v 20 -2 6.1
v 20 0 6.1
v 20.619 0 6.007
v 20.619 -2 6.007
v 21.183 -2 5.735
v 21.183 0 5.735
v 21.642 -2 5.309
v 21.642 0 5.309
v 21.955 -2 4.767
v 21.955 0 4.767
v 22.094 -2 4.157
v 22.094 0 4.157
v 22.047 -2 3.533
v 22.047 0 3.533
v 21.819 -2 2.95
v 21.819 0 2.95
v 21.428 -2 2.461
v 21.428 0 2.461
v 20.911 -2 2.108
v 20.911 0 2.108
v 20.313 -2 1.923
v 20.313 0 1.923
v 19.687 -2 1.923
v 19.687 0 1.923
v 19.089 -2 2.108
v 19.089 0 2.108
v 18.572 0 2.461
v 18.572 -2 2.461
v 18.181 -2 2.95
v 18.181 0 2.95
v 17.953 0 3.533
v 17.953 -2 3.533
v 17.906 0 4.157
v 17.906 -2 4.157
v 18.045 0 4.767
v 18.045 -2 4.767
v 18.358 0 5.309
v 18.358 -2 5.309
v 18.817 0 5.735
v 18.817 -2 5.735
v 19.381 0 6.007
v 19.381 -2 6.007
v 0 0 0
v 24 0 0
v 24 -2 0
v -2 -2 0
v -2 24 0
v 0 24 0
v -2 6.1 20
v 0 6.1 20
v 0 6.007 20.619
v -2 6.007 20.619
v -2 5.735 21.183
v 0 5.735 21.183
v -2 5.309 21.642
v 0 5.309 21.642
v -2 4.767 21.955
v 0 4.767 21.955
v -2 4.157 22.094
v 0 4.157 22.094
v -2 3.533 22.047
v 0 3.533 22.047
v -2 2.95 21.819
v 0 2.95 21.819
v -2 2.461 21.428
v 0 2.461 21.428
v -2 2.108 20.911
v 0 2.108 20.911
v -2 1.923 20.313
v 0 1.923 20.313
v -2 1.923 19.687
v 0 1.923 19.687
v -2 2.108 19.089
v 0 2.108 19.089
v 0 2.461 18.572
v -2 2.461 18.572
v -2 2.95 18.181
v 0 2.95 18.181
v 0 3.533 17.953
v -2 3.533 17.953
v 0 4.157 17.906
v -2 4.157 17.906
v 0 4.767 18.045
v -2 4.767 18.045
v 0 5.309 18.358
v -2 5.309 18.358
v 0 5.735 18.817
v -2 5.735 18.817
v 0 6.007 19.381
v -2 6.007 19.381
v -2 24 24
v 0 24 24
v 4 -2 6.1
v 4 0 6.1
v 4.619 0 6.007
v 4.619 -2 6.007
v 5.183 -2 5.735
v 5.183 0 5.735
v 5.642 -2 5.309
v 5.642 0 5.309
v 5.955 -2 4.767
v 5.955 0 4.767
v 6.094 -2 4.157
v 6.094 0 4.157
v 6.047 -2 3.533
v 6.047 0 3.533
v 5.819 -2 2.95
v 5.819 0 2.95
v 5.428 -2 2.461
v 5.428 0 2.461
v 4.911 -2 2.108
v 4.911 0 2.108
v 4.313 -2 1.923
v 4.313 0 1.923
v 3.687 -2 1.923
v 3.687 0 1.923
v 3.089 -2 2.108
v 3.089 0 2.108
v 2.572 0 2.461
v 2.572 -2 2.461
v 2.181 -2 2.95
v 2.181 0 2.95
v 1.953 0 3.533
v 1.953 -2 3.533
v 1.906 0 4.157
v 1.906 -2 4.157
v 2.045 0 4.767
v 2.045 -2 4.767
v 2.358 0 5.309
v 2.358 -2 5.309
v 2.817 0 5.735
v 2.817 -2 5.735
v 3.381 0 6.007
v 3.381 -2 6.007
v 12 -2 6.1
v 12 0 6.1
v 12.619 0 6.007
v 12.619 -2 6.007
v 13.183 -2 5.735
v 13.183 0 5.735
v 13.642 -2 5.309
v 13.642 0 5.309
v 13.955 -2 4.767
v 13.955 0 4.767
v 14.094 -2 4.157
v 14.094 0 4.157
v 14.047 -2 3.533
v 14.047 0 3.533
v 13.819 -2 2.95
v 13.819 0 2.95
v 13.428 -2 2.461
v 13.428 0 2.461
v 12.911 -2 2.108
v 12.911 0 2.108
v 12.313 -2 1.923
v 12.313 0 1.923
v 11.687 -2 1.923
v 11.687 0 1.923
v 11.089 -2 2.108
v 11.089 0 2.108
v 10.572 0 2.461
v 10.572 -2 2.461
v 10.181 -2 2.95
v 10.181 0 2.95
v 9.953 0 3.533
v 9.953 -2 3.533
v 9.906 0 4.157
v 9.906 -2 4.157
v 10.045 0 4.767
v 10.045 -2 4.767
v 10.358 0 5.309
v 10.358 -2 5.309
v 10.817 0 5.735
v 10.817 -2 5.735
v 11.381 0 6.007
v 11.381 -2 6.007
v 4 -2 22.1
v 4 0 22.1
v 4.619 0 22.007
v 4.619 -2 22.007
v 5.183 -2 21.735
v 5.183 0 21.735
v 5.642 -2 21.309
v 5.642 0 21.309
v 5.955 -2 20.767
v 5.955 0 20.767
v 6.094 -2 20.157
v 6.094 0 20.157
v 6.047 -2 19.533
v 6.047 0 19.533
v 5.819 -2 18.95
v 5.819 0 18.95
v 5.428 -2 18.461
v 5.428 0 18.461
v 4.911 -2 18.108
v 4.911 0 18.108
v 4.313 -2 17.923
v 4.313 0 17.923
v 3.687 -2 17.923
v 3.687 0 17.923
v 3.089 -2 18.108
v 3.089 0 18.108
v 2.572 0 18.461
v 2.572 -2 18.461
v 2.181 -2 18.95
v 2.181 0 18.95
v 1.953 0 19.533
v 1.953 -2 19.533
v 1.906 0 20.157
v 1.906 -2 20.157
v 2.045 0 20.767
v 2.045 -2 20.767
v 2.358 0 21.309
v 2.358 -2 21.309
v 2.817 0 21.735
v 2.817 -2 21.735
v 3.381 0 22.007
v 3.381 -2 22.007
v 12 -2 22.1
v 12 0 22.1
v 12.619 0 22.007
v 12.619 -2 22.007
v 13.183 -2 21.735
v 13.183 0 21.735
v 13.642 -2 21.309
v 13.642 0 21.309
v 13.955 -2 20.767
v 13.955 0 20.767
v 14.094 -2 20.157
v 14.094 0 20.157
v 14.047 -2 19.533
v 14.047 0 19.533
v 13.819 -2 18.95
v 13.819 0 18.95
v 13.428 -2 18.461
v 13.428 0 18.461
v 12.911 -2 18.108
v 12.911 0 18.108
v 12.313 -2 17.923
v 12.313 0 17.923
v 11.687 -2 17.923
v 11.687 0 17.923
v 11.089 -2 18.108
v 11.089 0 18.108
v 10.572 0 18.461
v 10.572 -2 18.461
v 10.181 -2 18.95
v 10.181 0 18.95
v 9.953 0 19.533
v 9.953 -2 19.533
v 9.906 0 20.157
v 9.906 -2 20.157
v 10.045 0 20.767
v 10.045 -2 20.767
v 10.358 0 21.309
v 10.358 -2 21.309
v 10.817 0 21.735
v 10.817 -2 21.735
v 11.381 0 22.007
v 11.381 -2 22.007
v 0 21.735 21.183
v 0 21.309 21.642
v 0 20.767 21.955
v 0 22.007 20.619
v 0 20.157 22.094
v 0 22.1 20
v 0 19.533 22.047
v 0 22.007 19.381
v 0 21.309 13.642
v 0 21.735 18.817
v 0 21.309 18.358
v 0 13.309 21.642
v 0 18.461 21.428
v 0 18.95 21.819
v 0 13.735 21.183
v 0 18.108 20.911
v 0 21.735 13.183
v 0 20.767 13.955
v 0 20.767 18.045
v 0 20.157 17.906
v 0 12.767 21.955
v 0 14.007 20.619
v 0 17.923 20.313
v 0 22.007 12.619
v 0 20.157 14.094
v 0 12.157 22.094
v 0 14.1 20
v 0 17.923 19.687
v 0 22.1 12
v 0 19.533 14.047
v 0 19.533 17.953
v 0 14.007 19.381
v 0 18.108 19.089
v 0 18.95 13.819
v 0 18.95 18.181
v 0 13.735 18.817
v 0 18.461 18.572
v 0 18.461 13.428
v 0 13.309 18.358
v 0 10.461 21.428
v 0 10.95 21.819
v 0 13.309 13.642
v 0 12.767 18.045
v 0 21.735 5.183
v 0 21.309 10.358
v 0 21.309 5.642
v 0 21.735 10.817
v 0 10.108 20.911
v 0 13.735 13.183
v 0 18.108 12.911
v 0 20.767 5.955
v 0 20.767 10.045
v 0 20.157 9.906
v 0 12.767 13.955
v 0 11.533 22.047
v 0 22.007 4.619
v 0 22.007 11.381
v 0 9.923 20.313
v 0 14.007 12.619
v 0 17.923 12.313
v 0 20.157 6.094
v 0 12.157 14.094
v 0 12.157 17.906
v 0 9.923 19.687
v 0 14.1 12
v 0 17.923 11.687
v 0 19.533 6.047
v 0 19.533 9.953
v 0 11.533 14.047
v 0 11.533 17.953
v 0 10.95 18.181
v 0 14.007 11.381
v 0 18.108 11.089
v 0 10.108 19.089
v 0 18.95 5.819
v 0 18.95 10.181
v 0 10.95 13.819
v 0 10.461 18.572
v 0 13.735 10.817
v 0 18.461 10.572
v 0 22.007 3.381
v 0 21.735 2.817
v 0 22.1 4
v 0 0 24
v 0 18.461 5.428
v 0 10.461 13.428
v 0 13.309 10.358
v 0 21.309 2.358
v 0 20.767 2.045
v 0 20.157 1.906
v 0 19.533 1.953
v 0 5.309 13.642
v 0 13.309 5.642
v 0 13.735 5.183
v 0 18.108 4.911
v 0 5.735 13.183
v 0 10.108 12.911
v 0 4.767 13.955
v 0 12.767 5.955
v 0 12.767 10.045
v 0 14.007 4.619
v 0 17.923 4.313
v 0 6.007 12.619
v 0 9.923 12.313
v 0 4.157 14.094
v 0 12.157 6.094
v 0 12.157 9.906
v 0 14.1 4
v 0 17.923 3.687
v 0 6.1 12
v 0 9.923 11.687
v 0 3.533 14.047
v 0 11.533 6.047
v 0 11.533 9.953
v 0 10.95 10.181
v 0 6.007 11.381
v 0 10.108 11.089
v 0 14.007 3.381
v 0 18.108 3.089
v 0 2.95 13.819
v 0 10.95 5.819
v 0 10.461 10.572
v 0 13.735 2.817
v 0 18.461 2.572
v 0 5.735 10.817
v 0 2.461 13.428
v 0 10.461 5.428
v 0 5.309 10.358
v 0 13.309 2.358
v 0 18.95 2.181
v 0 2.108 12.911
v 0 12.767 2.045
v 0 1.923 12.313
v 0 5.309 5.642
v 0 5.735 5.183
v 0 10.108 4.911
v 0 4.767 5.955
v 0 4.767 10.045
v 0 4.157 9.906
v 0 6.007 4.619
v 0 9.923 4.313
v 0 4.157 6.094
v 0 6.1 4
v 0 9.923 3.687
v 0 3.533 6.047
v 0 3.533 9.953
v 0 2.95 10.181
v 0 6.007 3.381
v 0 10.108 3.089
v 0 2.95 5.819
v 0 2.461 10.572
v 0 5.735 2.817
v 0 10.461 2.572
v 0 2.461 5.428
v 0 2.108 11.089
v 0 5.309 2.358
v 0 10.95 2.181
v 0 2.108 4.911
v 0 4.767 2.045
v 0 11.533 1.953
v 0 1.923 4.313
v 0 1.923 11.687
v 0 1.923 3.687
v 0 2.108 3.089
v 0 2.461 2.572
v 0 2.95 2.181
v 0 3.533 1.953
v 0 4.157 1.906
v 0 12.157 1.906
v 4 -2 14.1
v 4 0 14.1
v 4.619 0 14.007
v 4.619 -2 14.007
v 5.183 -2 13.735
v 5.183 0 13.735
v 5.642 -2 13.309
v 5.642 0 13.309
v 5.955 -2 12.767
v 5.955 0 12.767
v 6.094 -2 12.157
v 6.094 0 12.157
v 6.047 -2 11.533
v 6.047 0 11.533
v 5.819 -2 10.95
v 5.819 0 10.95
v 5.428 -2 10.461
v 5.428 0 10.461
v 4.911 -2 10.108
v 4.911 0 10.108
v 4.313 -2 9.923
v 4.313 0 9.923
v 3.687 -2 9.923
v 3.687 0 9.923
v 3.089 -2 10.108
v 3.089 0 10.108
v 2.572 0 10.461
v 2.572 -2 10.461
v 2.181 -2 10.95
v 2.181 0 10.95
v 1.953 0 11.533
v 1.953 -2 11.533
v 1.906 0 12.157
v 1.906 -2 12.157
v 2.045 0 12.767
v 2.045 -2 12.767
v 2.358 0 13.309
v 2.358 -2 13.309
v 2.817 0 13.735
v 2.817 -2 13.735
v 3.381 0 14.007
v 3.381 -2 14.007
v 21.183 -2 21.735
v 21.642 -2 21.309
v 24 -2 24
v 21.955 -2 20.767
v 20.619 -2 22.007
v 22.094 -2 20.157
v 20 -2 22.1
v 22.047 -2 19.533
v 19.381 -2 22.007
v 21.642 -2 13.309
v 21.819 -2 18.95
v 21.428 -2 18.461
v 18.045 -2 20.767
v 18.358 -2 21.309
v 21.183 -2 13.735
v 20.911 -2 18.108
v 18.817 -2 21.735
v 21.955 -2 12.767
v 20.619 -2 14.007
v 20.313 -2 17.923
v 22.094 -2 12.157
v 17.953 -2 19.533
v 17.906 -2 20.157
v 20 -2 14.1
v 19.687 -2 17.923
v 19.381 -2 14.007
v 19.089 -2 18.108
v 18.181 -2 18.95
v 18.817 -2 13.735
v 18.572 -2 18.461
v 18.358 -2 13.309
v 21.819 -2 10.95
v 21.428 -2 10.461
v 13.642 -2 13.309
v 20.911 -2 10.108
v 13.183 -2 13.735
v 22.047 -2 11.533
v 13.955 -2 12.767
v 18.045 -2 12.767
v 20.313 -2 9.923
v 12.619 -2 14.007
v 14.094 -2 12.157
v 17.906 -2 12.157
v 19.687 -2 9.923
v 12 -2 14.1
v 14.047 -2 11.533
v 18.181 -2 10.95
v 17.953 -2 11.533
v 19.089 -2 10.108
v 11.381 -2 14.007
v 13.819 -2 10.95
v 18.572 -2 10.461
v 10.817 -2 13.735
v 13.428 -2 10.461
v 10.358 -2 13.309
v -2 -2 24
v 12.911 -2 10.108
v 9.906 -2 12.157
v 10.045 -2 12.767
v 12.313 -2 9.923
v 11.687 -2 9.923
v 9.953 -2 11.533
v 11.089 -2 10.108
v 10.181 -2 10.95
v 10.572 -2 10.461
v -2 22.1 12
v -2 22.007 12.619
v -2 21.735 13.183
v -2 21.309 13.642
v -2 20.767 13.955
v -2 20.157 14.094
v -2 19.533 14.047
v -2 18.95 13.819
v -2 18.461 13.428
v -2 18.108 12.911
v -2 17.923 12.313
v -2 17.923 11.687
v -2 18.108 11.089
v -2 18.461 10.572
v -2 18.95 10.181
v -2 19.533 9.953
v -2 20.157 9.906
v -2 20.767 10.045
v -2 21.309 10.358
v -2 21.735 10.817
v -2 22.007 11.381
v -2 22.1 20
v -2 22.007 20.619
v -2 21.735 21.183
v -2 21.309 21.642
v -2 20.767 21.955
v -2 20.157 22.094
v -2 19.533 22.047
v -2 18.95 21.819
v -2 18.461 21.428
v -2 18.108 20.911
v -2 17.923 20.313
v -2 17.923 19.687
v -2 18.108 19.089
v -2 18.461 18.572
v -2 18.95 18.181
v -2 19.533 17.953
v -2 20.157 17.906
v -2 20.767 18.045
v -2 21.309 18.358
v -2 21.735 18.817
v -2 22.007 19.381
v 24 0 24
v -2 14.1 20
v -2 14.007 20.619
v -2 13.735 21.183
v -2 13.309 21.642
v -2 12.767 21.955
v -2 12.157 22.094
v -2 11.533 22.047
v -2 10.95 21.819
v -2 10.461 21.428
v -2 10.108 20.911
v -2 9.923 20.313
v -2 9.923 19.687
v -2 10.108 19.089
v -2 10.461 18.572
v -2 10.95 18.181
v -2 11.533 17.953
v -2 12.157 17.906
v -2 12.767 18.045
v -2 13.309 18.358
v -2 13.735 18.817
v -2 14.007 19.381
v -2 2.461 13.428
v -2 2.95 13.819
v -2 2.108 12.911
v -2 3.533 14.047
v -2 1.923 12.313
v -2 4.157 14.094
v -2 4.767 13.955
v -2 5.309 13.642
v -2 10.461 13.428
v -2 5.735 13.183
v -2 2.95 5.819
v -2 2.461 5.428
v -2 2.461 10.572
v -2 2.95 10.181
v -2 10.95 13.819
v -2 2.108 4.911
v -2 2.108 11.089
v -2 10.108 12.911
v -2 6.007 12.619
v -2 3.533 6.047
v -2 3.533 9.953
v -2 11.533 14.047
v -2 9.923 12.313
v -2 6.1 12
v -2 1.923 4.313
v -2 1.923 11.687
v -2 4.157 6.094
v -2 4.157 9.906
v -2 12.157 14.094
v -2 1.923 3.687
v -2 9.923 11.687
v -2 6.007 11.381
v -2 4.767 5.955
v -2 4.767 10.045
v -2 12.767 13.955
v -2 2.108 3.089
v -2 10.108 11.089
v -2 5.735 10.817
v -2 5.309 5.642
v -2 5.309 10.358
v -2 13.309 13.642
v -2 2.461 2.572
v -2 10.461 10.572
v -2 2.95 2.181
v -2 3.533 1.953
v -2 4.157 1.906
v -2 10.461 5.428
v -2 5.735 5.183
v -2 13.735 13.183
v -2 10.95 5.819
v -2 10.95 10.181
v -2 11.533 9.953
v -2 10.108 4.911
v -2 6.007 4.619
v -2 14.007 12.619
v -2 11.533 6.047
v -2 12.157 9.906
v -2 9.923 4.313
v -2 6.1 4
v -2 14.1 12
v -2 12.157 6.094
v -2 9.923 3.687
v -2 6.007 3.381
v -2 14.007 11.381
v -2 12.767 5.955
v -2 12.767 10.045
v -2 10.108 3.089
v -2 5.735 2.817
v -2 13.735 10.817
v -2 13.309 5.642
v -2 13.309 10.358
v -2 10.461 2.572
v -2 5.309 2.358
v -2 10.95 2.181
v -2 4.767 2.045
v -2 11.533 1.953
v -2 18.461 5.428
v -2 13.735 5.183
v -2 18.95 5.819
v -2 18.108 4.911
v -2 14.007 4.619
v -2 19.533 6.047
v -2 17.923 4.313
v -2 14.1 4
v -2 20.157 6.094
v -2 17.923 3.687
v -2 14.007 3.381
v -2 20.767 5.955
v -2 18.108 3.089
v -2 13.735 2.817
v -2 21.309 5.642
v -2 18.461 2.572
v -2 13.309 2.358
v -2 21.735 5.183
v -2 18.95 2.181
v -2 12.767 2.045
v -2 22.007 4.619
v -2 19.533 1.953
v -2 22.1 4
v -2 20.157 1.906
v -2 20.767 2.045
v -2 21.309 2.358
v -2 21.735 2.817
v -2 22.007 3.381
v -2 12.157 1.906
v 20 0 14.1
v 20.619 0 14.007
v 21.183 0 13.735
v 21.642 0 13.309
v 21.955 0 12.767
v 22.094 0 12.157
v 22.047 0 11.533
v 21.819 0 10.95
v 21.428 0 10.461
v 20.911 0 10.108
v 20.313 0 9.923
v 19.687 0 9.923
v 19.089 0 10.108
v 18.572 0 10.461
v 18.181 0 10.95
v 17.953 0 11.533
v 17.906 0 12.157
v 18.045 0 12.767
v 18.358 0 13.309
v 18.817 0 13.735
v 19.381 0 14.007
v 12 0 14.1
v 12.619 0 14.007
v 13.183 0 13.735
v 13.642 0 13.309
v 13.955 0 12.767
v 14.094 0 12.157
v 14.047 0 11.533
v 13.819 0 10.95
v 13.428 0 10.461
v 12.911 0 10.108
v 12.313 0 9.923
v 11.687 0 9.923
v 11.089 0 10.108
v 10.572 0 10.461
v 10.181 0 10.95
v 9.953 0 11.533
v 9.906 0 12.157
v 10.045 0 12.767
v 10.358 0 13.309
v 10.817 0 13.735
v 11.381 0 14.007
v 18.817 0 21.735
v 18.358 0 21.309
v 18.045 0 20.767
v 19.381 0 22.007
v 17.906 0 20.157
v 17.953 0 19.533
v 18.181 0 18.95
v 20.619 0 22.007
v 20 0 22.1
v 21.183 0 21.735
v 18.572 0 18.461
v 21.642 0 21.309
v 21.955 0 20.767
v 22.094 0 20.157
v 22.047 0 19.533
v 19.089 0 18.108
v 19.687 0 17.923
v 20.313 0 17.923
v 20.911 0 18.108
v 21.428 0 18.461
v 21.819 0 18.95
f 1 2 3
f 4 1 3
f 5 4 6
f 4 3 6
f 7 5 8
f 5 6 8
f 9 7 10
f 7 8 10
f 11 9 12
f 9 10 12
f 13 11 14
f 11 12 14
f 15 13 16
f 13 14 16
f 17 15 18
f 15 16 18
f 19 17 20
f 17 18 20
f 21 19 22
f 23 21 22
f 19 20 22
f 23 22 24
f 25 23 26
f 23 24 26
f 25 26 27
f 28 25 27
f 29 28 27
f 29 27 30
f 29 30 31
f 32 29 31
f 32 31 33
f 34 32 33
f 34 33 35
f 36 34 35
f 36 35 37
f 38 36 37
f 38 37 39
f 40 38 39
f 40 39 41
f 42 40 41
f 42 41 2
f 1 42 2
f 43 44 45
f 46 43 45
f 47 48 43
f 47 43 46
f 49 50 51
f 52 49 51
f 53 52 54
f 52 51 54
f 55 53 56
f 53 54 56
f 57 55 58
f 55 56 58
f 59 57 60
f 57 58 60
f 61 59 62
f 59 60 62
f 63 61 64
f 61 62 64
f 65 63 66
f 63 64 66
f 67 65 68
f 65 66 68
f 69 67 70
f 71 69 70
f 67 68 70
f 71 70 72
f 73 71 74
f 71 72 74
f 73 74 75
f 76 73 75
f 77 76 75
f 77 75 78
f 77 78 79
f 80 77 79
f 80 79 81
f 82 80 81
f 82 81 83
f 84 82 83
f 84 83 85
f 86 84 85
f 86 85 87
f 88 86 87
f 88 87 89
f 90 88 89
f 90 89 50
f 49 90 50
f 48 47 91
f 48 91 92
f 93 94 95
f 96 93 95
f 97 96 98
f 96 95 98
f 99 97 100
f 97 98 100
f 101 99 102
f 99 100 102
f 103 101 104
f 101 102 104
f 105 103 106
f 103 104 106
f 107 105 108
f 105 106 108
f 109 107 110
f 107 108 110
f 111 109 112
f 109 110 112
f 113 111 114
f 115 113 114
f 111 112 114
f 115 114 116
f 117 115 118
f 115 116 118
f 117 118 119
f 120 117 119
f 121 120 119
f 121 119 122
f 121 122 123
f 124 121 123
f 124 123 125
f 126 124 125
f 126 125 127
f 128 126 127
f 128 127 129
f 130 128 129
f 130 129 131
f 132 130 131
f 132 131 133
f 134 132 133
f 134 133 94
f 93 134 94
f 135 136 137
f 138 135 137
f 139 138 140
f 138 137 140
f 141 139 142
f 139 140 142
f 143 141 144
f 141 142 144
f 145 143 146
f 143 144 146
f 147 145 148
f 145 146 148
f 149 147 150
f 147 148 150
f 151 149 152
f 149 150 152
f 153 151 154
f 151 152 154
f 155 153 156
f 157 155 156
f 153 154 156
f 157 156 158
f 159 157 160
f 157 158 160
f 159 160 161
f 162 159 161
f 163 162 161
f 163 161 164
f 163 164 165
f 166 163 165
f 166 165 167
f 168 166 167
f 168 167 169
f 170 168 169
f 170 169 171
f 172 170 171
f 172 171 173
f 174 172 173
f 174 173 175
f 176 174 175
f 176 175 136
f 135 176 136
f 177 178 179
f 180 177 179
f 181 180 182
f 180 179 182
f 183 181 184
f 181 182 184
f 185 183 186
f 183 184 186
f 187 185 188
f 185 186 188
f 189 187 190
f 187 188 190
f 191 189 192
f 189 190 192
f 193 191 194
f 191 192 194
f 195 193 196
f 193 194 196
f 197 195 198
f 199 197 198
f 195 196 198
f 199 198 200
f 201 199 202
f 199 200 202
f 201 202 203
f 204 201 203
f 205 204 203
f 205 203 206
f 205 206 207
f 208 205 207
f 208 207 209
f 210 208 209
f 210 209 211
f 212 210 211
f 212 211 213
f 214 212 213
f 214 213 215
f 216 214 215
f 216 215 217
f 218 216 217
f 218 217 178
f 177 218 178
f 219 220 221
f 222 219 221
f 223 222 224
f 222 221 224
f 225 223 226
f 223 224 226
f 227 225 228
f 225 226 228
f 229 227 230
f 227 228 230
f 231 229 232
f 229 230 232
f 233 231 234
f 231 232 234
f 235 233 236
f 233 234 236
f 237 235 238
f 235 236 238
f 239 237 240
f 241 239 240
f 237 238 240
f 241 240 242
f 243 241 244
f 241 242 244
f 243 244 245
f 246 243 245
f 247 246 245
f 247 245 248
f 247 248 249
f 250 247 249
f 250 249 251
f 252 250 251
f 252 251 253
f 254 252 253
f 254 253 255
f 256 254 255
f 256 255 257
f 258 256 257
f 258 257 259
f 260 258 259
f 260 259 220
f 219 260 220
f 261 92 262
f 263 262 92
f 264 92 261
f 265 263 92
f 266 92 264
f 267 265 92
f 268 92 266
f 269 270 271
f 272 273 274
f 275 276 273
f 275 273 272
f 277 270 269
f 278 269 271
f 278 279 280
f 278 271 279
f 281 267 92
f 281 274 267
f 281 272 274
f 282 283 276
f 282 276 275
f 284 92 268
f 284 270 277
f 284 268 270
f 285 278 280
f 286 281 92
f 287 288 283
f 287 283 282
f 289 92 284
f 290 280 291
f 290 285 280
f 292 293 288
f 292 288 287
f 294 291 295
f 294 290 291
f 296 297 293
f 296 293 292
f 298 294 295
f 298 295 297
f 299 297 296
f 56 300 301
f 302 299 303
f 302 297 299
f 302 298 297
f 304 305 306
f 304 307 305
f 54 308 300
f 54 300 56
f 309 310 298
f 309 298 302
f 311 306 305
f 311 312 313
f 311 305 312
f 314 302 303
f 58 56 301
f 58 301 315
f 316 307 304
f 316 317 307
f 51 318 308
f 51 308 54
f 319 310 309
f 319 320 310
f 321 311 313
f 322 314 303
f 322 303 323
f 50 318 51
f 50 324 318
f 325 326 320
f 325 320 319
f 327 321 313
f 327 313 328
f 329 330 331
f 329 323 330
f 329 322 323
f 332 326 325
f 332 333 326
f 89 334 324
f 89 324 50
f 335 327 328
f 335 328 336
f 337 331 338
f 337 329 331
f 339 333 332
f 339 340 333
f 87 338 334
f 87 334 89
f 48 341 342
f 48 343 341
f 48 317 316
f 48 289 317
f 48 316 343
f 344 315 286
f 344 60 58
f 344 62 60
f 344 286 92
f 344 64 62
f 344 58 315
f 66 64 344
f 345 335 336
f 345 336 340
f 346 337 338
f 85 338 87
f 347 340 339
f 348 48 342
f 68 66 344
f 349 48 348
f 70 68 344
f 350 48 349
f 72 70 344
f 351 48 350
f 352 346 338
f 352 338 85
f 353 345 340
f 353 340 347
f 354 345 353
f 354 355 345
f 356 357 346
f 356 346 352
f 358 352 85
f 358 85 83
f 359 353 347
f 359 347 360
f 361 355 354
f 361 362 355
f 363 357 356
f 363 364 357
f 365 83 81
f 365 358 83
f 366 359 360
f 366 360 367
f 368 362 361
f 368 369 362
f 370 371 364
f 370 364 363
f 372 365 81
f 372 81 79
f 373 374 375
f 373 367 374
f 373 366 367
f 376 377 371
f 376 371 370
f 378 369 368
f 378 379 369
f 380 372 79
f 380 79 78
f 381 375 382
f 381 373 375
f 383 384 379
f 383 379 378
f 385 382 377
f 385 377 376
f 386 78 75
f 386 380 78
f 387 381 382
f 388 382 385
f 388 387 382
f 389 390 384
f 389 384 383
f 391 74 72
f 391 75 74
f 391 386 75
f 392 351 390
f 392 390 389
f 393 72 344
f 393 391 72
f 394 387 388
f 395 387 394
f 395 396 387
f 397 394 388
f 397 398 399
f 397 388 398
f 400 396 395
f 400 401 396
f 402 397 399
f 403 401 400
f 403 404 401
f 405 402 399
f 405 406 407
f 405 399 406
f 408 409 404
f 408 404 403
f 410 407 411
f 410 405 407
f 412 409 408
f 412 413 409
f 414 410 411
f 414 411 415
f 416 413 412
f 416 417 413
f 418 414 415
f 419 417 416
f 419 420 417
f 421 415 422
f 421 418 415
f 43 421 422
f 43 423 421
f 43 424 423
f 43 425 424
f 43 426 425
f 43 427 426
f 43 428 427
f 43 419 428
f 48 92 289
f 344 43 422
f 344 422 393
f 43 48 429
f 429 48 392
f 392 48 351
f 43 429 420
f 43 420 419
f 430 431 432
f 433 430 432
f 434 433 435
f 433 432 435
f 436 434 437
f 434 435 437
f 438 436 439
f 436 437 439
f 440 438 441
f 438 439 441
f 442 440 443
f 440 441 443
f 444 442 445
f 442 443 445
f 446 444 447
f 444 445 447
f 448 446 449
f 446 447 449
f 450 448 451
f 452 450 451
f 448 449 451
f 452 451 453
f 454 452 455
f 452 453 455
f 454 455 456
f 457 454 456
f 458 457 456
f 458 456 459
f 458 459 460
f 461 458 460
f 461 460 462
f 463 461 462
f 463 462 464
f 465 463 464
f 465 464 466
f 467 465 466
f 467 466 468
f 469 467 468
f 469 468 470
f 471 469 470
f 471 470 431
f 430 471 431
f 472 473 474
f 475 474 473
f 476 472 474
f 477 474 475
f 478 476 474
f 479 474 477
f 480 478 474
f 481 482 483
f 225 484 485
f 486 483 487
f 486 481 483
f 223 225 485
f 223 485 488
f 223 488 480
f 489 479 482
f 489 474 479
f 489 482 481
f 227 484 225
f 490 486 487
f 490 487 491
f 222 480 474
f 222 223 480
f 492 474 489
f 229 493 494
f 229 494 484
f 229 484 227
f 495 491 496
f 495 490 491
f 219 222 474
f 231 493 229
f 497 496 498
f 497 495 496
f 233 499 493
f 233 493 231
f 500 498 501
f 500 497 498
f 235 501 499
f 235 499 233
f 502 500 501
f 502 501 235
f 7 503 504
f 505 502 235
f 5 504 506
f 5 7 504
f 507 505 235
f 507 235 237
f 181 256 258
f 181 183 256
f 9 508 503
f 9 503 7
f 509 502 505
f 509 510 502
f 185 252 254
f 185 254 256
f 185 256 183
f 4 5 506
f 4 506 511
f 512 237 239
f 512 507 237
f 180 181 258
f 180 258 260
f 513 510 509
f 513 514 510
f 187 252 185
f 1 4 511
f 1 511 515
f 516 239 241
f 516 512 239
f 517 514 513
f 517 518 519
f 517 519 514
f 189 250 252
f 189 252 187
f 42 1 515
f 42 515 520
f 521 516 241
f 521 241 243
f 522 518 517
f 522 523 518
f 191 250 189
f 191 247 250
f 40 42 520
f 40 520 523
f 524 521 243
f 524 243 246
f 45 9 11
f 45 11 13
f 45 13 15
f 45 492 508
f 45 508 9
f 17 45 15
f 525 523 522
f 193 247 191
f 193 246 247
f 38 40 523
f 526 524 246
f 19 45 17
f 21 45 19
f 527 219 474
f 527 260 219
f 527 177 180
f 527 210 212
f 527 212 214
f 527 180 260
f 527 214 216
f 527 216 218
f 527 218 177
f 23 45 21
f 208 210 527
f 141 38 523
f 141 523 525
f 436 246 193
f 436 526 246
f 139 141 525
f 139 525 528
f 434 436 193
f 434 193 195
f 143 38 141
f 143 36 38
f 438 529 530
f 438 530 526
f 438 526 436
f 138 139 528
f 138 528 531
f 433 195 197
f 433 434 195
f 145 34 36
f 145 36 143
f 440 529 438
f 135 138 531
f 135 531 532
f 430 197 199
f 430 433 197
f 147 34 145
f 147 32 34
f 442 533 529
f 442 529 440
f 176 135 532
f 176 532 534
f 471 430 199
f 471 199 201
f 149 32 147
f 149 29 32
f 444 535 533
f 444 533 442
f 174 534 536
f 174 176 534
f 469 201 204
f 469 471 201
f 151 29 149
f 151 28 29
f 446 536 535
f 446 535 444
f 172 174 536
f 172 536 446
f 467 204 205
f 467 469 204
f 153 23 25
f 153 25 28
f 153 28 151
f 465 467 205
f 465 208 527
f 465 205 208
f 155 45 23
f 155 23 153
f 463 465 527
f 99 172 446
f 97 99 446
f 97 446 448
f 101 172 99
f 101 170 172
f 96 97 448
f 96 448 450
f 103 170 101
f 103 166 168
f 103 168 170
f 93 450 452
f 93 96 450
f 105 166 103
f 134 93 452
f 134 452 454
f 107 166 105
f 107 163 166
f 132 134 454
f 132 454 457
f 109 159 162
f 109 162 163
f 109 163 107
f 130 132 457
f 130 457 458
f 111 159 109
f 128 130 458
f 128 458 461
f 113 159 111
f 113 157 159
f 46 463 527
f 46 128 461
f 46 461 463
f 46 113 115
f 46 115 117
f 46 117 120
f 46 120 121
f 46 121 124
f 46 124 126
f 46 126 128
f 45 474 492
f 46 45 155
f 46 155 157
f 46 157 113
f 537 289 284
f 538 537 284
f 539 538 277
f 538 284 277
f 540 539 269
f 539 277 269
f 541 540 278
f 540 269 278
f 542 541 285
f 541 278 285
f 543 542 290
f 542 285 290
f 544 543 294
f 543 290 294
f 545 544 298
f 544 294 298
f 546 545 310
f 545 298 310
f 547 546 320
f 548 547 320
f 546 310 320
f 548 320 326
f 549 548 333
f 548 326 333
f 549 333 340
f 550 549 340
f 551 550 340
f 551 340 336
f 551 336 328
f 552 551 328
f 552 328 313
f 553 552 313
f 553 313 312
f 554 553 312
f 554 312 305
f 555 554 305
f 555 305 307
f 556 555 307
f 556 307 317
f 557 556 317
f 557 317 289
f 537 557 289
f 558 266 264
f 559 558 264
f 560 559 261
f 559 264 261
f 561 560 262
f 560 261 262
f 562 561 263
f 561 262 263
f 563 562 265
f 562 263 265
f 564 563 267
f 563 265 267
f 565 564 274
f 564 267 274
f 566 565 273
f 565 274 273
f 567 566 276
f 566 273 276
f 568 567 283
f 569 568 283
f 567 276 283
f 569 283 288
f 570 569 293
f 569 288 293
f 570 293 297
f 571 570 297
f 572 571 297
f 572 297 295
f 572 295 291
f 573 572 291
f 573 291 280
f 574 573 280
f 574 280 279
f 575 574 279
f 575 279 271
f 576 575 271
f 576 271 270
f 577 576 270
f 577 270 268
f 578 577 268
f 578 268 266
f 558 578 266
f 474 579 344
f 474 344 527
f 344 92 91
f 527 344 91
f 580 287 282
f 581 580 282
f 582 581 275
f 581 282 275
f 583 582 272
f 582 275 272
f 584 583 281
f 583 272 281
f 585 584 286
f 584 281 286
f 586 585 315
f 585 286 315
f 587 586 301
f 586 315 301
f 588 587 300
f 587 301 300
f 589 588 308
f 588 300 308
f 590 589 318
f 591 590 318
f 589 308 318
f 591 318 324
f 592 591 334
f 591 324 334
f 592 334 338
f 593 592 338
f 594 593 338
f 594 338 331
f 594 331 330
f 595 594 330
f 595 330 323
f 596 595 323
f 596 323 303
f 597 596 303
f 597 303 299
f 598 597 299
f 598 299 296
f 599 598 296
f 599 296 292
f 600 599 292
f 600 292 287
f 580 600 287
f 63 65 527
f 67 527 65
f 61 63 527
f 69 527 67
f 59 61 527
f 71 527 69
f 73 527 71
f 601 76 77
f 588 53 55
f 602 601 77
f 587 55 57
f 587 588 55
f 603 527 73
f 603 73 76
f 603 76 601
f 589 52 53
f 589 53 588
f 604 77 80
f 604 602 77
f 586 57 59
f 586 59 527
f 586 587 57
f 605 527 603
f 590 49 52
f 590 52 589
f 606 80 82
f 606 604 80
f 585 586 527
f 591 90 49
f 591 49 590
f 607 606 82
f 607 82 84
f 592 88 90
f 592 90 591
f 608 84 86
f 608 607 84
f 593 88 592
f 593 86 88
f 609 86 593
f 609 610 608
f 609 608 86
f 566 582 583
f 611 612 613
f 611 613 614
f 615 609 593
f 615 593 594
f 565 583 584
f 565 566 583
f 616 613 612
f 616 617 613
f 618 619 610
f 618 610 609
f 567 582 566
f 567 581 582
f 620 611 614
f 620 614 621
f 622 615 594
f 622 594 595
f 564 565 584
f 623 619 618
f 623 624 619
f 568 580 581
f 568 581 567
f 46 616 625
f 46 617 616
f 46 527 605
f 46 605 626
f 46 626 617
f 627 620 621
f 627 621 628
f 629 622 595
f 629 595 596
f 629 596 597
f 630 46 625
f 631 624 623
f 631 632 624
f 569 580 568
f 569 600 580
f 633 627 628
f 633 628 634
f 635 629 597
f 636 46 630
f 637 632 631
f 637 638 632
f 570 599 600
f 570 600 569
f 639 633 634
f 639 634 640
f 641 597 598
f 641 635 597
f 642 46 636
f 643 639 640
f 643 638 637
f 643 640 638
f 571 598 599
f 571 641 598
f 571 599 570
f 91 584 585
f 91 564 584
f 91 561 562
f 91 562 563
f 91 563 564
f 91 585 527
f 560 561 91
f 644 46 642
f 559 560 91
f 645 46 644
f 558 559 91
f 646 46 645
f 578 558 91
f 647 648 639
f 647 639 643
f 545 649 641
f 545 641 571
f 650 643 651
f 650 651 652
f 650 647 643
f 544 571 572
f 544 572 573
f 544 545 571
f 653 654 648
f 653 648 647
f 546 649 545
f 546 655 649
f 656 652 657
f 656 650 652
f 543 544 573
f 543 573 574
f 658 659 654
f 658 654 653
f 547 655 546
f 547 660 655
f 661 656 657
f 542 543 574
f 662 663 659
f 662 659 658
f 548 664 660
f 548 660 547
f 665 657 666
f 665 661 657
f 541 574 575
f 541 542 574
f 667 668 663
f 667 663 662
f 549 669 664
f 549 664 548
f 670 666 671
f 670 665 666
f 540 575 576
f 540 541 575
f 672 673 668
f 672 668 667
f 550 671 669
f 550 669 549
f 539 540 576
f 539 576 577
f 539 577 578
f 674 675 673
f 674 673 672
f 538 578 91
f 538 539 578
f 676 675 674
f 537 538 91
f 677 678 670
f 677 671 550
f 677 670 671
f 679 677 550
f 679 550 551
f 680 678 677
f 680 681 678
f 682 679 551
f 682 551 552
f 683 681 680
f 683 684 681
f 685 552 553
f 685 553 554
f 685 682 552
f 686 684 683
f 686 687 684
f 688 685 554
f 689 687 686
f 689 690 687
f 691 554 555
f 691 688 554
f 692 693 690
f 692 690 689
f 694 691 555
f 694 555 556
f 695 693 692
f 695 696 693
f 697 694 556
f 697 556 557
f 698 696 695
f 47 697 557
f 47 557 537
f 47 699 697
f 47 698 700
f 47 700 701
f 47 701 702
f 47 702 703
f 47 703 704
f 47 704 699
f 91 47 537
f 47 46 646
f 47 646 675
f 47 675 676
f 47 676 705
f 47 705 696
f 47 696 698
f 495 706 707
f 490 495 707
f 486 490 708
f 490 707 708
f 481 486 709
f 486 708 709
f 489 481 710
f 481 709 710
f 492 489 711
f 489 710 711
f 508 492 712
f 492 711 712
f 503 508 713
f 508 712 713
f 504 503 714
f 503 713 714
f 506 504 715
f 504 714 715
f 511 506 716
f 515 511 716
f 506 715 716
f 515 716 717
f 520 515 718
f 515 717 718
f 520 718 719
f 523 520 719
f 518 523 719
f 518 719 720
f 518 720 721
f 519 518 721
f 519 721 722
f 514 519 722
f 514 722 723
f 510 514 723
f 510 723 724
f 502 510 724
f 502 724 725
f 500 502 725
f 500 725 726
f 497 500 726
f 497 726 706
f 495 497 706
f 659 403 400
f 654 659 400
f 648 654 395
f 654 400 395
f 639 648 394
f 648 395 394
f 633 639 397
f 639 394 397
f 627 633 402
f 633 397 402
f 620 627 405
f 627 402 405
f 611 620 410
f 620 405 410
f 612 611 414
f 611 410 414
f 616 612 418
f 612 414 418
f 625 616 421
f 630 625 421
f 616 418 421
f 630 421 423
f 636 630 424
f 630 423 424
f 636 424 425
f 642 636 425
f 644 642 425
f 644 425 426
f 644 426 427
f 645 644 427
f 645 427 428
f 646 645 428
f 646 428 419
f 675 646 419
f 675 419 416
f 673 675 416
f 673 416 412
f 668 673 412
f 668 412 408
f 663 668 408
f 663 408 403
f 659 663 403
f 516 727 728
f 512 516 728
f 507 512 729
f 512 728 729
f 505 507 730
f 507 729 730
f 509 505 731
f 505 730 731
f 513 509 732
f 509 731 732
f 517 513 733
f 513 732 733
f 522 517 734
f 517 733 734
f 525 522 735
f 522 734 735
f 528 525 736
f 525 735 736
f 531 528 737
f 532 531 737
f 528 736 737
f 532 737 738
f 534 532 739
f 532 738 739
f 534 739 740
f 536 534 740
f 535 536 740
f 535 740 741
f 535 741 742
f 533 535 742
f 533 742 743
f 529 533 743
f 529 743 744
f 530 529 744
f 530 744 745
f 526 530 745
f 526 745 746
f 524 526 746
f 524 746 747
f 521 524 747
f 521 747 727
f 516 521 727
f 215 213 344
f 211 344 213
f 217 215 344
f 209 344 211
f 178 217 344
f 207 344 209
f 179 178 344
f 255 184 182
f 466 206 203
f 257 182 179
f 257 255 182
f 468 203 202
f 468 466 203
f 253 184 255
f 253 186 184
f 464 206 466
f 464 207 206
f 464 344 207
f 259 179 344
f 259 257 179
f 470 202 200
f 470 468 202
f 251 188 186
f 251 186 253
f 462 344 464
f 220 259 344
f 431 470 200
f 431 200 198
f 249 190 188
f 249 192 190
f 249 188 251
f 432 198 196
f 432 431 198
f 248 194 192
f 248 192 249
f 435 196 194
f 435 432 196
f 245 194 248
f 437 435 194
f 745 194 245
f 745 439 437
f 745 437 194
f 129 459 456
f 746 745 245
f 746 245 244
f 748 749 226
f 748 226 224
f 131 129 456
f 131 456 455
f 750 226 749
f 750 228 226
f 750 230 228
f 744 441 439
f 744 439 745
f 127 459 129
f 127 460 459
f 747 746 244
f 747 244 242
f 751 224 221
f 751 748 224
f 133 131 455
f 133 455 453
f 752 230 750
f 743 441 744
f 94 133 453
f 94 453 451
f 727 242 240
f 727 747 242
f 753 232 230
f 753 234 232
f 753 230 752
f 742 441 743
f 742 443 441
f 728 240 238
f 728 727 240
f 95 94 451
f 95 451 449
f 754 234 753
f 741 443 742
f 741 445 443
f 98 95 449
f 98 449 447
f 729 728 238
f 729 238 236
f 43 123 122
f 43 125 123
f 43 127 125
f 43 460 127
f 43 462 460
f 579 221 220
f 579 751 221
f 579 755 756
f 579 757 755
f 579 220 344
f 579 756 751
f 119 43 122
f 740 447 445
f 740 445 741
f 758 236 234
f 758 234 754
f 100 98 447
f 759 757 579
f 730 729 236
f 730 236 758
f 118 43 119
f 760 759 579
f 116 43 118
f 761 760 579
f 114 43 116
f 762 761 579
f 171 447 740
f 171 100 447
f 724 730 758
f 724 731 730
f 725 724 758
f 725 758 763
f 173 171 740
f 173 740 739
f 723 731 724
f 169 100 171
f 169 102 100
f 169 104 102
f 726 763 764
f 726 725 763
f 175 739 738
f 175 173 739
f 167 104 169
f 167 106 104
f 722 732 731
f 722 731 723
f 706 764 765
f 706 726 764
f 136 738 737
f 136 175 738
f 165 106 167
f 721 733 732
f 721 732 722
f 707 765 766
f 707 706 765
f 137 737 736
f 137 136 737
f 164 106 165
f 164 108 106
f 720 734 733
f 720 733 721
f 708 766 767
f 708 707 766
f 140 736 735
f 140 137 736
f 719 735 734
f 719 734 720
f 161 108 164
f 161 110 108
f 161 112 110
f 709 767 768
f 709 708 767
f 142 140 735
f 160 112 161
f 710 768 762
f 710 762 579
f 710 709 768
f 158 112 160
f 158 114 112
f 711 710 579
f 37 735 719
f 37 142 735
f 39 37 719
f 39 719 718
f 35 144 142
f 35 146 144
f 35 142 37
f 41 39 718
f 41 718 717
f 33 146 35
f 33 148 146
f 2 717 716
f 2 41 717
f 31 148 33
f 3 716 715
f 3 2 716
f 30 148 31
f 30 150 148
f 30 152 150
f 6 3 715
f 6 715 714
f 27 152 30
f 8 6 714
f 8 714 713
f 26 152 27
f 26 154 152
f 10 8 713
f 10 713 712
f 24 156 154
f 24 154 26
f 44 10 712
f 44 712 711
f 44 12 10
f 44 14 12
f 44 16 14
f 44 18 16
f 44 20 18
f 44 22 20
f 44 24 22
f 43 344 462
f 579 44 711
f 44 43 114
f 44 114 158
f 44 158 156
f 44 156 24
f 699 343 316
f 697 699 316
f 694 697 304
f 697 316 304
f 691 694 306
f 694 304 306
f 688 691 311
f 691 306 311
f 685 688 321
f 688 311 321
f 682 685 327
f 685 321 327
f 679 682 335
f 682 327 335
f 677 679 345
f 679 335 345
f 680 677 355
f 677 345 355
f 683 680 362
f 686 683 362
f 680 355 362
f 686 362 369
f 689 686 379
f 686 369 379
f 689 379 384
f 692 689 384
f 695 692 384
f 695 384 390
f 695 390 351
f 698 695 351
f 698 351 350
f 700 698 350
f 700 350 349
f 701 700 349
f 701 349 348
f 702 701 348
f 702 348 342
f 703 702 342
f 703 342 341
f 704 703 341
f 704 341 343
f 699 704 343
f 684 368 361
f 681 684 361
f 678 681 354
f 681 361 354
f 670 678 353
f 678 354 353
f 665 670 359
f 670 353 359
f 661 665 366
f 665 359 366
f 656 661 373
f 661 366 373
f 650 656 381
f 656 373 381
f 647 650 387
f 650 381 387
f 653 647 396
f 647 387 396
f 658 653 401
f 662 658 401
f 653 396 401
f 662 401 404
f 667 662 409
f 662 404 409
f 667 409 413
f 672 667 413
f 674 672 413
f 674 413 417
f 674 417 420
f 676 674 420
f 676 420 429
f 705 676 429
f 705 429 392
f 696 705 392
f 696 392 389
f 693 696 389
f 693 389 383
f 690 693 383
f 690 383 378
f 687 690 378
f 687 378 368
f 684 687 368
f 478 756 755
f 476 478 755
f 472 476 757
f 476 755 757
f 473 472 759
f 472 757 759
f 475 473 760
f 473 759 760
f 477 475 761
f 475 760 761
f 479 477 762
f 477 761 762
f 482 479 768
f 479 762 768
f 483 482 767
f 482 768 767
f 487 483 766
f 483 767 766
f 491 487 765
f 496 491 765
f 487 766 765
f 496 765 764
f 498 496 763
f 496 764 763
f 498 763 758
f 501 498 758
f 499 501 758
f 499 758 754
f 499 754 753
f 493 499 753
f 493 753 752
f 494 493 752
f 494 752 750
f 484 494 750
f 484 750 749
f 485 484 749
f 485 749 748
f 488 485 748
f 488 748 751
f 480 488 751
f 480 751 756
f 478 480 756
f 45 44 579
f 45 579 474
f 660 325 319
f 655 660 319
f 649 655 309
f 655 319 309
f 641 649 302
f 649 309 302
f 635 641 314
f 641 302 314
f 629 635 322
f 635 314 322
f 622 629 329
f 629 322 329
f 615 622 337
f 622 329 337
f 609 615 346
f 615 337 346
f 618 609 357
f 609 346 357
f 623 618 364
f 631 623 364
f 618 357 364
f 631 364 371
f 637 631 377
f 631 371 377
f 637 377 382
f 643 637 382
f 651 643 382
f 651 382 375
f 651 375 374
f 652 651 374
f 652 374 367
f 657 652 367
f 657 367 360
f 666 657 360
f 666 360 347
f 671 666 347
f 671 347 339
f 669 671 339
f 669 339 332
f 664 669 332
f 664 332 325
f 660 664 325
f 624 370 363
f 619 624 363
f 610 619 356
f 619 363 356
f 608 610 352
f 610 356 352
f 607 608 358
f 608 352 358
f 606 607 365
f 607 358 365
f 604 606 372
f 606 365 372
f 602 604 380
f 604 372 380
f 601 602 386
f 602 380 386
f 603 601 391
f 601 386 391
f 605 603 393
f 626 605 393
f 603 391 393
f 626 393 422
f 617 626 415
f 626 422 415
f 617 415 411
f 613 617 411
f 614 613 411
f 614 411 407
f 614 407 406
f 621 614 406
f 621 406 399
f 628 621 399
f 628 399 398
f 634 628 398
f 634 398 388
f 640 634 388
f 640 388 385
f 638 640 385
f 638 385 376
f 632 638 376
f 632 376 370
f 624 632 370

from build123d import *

# Parameters (mm, degrees)
EXTRU_MINCE1_DEPTH              = 24
ESQUISSE2_R                     = 2.1
ENL_V_MAT_EXTRU_1_DEPTH         = 42.569219382
R_P_TITION_LIN_AIRE1_COUNT      = 3
R_P_TITION_LIN_AIRE1_PITCH      = 8
R_P_TITION_LIN_AIRE1_COUNT_DIR2 = 3
R_P_TITION_LIN_AIRE1_PITCH_DIR2 = 8
ESQUISSE3_R                     = 2.1
ENL_V_MAT_EXTRU_2_DEPTH         = 42.569219382
R_P_TITION_LIN_AIRE2_COUNT      = 3
R_P_TITION_LIN_AIRE2_PITCH      = 8
R_P_TITION_LIN_AIRE2_COUNT_DIR2 = 3
R_P_TITION_LIN_AIRE2_PITCH_DIR2 = 8


with BuildPart() as part:
    # Esquisse1 → Extru.-Mince1 (new body)
    with BuildSketch(Plane.XY):
        Polygon((0, 24), (0, 0), (24, 0), (24, -2), (-2, -2), (-2, 24), align=None)
    extrude(amount=EXTRU_MINCE1_DEPTH)

    # Esquisse2 → Enlèv. mat.-Extru.1 (cut, through all)
    with BuildSketch(Plane(origin=(0, 0, 0), x_dir=(1, 0, 0), z_dir=(0, 1, 0))):
        with Locations(Location((4, -20, 0), (0, 0, 270))):
            Circle(ESQUISSE2_R)
    enl_v_mat_extru_1 = extrude(amount=-ENL_V_MAT_EXTRU_1_DEPTH, mode=Mode.SUBTRACT)

    # Répétition linéaire1: Enl_v. mat.-Extru.1 3 × 3
    with Locations(*[(i * R_P_TITION_LIN_AIRE1_PITCH, 0, -j * R_P_TITION_LIN_AIRE1_PITCH_DIR2) for i in range(R_P_TITION_LIN_AIRE1_COUNT) for j in range(R_P_TITION_LIN_AIRE1_COUNT_DIR2) if (i, j) != (0, 0)]):
        add(enl_v_mat_extru_1, mode=Mode.SUBTRACT)

    # Esquisse3 → Enlèv. mat.-Extru.2 (cut, through all)
    with BuildSketch(Plane(origin=(0, 0, 0), x_dir=(0, 0, -1), z_dir=(1, 0, 0))):
        with Locations(Location((-20, 4, 0), (0, 0, 90))):
            Circle(ESQUISSE3_R)
    enl_v_mat_extru_2 = extrude(amount=-ENL_V_MAT_EXTRU_2_DEPTH, mode=Mode.SUBTRACT)

    # Répétition linéaire2: Enl_v. mat.-Extru.2 3 × 3
    with Locations(*[(0, i * R_P_TITION_LIN_AIRE2_PITCH, -j * R_P_TITION_LIN_AIRE2_PITCH_DIR2) for i in range(R_P_TITION_LIN_AIRE2_COUNT) for j in range(R_P_TITION_LIN_AIRE2_COUNT_DIR2) if (i, j) != (0, 0)]):
        add(enl_v_mat_extru_2, mode=Mode.SUBTRACT)


solid = part.part
